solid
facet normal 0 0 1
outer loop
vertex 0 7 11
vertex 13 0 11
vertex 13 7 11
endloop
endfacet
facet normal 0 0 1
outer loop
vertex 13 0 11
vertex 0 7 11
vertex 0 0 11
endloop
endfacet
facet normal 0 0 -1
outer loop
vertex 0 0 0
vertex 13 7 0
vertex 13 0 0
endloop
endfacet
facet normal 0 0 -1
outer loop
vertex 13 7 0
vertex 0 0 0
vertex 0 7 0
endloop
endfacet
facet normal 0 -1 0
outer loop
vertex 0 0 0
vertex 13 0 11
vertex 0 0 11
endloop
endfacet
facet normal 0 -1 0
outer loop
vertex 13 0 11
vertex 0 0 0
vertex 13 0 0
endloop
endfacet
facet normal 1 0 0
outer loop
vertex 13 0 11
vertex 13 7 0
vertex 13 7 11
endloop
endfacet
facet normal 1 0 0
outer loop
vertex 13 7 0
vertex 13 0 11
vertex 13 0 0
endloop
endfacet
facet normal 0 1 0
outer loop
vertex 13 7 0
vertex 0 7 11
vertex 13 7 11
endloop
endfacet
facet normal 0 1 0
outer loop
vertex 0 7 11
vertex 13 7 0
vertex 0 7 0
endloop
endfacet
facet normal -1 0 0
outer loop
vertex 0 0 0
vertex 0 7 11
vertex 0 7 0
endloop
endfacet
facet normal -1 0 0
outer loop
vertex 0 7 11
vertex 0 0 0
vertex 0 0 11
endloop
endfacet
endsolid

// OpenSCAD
// Generated by SolidPython 1.0.1 on 2020-07-29 00:46:55


cube(size = [13, 7, 11]);
/***********************************************
*********      SolidPython code:      **********
************************************************
 
# import packages: SolidPython
from solid import *
from solid.utils import *
from itertools import chain, combinations, permutations


class Resize:

    def __init__(self, scad_file):
        self.scad_file = scad_file
        #self.scad_file = import_scad(scad_file)
        # cone/cylinder param:
        self.r1 = 0
        self.r2 = 0
        self.h = 0
        # rectangular prism param:
        self.w = 0
        self.l = 0
        # ellipse param:
        self.r = 0

    # import OpenScad code (file name corresponds to shape)


    # classify shape + parameters
    def assign(self, param1, param2, param3):
        if self.scad_file == 'cone.scad':
            self.r1 = param1
            self.r2 = param2
            self.h = param3
        elif self.scad_file == 'cylinder.scad':
            self.r1 = param1
            self.r2 = param2
            self.h = param3
        elif self.scad_file == 'rectangularPrism.scad':
            self.h = param1
            self.l = param2
            self.w = param3
        else:
            self.r = param1
            self.h = param2

    # resize parameters
    def iterate(self):
        x = range(3, 20, 2)
        i = 1
        if self.scad_file == 'cone.scad':
            tempList = list(permutations(x, 2))
            for temp in tempList:
                param1 = temp[0]
                param2 = temp[1]
                filepath = 'produced_scad_files/' + 'cone' + str(param1) + '_' + str(param2) + '_' + '.scad'
                scad_render_to_file(cylinder(h=param1, r1=param2, r2=0), filepath)

        elif self.scad_file == 'cylinder.scad':
            tempList = list(permutations(x, 3))
            for temp in tempList:
                param1 = temp[0]
                param2 = temp[1]
                filepath = 'produced_scad_files/' + 'cylinder' + str(param1) + '_' + str(param2) + '_' + '.scad'
                scad_render_to_file(cylinder(h=param1, r1=param2, r2=param2), filepath)

        elif self.scad_file == 'rectangularPrism.scad':
            tempList = list(permutations(x, 3))
            for temp in tempList:
                param1 = temp[0]
                param2 = temp[1]
                param3 = temp[2]
                filepath = 'produced_scad_files/' + 'rectangularPrism' + str(param1) + '_' + str(param2) + '_' + str(
                    param3) + '.scad'
                scad_render_to_file(cube(size=(param1, param2, param3)), filepath)

        elif self.scad_file == 'ellipse.scad':
            tempList = list(permutations(x, 4))
            for temp in tempList:
                param1 = temp[0]
                param2 = temp[1]
                param3 = temp[2]
                param4 = temp[3]
                filepath = 'produced_scad_files/' + 'ellipse' + str(param1) + '_' + str(param2) + '_' + str(param3) + '_' + str(param4) + '.scad'
                scad_render_to_file(scale([param1, param2, param3])(sphere(r=param4)), filepath)

    def render_to_scadfile(self):
        scad_render_to_file(scad, 'example.scad') 
 
************************************************/
